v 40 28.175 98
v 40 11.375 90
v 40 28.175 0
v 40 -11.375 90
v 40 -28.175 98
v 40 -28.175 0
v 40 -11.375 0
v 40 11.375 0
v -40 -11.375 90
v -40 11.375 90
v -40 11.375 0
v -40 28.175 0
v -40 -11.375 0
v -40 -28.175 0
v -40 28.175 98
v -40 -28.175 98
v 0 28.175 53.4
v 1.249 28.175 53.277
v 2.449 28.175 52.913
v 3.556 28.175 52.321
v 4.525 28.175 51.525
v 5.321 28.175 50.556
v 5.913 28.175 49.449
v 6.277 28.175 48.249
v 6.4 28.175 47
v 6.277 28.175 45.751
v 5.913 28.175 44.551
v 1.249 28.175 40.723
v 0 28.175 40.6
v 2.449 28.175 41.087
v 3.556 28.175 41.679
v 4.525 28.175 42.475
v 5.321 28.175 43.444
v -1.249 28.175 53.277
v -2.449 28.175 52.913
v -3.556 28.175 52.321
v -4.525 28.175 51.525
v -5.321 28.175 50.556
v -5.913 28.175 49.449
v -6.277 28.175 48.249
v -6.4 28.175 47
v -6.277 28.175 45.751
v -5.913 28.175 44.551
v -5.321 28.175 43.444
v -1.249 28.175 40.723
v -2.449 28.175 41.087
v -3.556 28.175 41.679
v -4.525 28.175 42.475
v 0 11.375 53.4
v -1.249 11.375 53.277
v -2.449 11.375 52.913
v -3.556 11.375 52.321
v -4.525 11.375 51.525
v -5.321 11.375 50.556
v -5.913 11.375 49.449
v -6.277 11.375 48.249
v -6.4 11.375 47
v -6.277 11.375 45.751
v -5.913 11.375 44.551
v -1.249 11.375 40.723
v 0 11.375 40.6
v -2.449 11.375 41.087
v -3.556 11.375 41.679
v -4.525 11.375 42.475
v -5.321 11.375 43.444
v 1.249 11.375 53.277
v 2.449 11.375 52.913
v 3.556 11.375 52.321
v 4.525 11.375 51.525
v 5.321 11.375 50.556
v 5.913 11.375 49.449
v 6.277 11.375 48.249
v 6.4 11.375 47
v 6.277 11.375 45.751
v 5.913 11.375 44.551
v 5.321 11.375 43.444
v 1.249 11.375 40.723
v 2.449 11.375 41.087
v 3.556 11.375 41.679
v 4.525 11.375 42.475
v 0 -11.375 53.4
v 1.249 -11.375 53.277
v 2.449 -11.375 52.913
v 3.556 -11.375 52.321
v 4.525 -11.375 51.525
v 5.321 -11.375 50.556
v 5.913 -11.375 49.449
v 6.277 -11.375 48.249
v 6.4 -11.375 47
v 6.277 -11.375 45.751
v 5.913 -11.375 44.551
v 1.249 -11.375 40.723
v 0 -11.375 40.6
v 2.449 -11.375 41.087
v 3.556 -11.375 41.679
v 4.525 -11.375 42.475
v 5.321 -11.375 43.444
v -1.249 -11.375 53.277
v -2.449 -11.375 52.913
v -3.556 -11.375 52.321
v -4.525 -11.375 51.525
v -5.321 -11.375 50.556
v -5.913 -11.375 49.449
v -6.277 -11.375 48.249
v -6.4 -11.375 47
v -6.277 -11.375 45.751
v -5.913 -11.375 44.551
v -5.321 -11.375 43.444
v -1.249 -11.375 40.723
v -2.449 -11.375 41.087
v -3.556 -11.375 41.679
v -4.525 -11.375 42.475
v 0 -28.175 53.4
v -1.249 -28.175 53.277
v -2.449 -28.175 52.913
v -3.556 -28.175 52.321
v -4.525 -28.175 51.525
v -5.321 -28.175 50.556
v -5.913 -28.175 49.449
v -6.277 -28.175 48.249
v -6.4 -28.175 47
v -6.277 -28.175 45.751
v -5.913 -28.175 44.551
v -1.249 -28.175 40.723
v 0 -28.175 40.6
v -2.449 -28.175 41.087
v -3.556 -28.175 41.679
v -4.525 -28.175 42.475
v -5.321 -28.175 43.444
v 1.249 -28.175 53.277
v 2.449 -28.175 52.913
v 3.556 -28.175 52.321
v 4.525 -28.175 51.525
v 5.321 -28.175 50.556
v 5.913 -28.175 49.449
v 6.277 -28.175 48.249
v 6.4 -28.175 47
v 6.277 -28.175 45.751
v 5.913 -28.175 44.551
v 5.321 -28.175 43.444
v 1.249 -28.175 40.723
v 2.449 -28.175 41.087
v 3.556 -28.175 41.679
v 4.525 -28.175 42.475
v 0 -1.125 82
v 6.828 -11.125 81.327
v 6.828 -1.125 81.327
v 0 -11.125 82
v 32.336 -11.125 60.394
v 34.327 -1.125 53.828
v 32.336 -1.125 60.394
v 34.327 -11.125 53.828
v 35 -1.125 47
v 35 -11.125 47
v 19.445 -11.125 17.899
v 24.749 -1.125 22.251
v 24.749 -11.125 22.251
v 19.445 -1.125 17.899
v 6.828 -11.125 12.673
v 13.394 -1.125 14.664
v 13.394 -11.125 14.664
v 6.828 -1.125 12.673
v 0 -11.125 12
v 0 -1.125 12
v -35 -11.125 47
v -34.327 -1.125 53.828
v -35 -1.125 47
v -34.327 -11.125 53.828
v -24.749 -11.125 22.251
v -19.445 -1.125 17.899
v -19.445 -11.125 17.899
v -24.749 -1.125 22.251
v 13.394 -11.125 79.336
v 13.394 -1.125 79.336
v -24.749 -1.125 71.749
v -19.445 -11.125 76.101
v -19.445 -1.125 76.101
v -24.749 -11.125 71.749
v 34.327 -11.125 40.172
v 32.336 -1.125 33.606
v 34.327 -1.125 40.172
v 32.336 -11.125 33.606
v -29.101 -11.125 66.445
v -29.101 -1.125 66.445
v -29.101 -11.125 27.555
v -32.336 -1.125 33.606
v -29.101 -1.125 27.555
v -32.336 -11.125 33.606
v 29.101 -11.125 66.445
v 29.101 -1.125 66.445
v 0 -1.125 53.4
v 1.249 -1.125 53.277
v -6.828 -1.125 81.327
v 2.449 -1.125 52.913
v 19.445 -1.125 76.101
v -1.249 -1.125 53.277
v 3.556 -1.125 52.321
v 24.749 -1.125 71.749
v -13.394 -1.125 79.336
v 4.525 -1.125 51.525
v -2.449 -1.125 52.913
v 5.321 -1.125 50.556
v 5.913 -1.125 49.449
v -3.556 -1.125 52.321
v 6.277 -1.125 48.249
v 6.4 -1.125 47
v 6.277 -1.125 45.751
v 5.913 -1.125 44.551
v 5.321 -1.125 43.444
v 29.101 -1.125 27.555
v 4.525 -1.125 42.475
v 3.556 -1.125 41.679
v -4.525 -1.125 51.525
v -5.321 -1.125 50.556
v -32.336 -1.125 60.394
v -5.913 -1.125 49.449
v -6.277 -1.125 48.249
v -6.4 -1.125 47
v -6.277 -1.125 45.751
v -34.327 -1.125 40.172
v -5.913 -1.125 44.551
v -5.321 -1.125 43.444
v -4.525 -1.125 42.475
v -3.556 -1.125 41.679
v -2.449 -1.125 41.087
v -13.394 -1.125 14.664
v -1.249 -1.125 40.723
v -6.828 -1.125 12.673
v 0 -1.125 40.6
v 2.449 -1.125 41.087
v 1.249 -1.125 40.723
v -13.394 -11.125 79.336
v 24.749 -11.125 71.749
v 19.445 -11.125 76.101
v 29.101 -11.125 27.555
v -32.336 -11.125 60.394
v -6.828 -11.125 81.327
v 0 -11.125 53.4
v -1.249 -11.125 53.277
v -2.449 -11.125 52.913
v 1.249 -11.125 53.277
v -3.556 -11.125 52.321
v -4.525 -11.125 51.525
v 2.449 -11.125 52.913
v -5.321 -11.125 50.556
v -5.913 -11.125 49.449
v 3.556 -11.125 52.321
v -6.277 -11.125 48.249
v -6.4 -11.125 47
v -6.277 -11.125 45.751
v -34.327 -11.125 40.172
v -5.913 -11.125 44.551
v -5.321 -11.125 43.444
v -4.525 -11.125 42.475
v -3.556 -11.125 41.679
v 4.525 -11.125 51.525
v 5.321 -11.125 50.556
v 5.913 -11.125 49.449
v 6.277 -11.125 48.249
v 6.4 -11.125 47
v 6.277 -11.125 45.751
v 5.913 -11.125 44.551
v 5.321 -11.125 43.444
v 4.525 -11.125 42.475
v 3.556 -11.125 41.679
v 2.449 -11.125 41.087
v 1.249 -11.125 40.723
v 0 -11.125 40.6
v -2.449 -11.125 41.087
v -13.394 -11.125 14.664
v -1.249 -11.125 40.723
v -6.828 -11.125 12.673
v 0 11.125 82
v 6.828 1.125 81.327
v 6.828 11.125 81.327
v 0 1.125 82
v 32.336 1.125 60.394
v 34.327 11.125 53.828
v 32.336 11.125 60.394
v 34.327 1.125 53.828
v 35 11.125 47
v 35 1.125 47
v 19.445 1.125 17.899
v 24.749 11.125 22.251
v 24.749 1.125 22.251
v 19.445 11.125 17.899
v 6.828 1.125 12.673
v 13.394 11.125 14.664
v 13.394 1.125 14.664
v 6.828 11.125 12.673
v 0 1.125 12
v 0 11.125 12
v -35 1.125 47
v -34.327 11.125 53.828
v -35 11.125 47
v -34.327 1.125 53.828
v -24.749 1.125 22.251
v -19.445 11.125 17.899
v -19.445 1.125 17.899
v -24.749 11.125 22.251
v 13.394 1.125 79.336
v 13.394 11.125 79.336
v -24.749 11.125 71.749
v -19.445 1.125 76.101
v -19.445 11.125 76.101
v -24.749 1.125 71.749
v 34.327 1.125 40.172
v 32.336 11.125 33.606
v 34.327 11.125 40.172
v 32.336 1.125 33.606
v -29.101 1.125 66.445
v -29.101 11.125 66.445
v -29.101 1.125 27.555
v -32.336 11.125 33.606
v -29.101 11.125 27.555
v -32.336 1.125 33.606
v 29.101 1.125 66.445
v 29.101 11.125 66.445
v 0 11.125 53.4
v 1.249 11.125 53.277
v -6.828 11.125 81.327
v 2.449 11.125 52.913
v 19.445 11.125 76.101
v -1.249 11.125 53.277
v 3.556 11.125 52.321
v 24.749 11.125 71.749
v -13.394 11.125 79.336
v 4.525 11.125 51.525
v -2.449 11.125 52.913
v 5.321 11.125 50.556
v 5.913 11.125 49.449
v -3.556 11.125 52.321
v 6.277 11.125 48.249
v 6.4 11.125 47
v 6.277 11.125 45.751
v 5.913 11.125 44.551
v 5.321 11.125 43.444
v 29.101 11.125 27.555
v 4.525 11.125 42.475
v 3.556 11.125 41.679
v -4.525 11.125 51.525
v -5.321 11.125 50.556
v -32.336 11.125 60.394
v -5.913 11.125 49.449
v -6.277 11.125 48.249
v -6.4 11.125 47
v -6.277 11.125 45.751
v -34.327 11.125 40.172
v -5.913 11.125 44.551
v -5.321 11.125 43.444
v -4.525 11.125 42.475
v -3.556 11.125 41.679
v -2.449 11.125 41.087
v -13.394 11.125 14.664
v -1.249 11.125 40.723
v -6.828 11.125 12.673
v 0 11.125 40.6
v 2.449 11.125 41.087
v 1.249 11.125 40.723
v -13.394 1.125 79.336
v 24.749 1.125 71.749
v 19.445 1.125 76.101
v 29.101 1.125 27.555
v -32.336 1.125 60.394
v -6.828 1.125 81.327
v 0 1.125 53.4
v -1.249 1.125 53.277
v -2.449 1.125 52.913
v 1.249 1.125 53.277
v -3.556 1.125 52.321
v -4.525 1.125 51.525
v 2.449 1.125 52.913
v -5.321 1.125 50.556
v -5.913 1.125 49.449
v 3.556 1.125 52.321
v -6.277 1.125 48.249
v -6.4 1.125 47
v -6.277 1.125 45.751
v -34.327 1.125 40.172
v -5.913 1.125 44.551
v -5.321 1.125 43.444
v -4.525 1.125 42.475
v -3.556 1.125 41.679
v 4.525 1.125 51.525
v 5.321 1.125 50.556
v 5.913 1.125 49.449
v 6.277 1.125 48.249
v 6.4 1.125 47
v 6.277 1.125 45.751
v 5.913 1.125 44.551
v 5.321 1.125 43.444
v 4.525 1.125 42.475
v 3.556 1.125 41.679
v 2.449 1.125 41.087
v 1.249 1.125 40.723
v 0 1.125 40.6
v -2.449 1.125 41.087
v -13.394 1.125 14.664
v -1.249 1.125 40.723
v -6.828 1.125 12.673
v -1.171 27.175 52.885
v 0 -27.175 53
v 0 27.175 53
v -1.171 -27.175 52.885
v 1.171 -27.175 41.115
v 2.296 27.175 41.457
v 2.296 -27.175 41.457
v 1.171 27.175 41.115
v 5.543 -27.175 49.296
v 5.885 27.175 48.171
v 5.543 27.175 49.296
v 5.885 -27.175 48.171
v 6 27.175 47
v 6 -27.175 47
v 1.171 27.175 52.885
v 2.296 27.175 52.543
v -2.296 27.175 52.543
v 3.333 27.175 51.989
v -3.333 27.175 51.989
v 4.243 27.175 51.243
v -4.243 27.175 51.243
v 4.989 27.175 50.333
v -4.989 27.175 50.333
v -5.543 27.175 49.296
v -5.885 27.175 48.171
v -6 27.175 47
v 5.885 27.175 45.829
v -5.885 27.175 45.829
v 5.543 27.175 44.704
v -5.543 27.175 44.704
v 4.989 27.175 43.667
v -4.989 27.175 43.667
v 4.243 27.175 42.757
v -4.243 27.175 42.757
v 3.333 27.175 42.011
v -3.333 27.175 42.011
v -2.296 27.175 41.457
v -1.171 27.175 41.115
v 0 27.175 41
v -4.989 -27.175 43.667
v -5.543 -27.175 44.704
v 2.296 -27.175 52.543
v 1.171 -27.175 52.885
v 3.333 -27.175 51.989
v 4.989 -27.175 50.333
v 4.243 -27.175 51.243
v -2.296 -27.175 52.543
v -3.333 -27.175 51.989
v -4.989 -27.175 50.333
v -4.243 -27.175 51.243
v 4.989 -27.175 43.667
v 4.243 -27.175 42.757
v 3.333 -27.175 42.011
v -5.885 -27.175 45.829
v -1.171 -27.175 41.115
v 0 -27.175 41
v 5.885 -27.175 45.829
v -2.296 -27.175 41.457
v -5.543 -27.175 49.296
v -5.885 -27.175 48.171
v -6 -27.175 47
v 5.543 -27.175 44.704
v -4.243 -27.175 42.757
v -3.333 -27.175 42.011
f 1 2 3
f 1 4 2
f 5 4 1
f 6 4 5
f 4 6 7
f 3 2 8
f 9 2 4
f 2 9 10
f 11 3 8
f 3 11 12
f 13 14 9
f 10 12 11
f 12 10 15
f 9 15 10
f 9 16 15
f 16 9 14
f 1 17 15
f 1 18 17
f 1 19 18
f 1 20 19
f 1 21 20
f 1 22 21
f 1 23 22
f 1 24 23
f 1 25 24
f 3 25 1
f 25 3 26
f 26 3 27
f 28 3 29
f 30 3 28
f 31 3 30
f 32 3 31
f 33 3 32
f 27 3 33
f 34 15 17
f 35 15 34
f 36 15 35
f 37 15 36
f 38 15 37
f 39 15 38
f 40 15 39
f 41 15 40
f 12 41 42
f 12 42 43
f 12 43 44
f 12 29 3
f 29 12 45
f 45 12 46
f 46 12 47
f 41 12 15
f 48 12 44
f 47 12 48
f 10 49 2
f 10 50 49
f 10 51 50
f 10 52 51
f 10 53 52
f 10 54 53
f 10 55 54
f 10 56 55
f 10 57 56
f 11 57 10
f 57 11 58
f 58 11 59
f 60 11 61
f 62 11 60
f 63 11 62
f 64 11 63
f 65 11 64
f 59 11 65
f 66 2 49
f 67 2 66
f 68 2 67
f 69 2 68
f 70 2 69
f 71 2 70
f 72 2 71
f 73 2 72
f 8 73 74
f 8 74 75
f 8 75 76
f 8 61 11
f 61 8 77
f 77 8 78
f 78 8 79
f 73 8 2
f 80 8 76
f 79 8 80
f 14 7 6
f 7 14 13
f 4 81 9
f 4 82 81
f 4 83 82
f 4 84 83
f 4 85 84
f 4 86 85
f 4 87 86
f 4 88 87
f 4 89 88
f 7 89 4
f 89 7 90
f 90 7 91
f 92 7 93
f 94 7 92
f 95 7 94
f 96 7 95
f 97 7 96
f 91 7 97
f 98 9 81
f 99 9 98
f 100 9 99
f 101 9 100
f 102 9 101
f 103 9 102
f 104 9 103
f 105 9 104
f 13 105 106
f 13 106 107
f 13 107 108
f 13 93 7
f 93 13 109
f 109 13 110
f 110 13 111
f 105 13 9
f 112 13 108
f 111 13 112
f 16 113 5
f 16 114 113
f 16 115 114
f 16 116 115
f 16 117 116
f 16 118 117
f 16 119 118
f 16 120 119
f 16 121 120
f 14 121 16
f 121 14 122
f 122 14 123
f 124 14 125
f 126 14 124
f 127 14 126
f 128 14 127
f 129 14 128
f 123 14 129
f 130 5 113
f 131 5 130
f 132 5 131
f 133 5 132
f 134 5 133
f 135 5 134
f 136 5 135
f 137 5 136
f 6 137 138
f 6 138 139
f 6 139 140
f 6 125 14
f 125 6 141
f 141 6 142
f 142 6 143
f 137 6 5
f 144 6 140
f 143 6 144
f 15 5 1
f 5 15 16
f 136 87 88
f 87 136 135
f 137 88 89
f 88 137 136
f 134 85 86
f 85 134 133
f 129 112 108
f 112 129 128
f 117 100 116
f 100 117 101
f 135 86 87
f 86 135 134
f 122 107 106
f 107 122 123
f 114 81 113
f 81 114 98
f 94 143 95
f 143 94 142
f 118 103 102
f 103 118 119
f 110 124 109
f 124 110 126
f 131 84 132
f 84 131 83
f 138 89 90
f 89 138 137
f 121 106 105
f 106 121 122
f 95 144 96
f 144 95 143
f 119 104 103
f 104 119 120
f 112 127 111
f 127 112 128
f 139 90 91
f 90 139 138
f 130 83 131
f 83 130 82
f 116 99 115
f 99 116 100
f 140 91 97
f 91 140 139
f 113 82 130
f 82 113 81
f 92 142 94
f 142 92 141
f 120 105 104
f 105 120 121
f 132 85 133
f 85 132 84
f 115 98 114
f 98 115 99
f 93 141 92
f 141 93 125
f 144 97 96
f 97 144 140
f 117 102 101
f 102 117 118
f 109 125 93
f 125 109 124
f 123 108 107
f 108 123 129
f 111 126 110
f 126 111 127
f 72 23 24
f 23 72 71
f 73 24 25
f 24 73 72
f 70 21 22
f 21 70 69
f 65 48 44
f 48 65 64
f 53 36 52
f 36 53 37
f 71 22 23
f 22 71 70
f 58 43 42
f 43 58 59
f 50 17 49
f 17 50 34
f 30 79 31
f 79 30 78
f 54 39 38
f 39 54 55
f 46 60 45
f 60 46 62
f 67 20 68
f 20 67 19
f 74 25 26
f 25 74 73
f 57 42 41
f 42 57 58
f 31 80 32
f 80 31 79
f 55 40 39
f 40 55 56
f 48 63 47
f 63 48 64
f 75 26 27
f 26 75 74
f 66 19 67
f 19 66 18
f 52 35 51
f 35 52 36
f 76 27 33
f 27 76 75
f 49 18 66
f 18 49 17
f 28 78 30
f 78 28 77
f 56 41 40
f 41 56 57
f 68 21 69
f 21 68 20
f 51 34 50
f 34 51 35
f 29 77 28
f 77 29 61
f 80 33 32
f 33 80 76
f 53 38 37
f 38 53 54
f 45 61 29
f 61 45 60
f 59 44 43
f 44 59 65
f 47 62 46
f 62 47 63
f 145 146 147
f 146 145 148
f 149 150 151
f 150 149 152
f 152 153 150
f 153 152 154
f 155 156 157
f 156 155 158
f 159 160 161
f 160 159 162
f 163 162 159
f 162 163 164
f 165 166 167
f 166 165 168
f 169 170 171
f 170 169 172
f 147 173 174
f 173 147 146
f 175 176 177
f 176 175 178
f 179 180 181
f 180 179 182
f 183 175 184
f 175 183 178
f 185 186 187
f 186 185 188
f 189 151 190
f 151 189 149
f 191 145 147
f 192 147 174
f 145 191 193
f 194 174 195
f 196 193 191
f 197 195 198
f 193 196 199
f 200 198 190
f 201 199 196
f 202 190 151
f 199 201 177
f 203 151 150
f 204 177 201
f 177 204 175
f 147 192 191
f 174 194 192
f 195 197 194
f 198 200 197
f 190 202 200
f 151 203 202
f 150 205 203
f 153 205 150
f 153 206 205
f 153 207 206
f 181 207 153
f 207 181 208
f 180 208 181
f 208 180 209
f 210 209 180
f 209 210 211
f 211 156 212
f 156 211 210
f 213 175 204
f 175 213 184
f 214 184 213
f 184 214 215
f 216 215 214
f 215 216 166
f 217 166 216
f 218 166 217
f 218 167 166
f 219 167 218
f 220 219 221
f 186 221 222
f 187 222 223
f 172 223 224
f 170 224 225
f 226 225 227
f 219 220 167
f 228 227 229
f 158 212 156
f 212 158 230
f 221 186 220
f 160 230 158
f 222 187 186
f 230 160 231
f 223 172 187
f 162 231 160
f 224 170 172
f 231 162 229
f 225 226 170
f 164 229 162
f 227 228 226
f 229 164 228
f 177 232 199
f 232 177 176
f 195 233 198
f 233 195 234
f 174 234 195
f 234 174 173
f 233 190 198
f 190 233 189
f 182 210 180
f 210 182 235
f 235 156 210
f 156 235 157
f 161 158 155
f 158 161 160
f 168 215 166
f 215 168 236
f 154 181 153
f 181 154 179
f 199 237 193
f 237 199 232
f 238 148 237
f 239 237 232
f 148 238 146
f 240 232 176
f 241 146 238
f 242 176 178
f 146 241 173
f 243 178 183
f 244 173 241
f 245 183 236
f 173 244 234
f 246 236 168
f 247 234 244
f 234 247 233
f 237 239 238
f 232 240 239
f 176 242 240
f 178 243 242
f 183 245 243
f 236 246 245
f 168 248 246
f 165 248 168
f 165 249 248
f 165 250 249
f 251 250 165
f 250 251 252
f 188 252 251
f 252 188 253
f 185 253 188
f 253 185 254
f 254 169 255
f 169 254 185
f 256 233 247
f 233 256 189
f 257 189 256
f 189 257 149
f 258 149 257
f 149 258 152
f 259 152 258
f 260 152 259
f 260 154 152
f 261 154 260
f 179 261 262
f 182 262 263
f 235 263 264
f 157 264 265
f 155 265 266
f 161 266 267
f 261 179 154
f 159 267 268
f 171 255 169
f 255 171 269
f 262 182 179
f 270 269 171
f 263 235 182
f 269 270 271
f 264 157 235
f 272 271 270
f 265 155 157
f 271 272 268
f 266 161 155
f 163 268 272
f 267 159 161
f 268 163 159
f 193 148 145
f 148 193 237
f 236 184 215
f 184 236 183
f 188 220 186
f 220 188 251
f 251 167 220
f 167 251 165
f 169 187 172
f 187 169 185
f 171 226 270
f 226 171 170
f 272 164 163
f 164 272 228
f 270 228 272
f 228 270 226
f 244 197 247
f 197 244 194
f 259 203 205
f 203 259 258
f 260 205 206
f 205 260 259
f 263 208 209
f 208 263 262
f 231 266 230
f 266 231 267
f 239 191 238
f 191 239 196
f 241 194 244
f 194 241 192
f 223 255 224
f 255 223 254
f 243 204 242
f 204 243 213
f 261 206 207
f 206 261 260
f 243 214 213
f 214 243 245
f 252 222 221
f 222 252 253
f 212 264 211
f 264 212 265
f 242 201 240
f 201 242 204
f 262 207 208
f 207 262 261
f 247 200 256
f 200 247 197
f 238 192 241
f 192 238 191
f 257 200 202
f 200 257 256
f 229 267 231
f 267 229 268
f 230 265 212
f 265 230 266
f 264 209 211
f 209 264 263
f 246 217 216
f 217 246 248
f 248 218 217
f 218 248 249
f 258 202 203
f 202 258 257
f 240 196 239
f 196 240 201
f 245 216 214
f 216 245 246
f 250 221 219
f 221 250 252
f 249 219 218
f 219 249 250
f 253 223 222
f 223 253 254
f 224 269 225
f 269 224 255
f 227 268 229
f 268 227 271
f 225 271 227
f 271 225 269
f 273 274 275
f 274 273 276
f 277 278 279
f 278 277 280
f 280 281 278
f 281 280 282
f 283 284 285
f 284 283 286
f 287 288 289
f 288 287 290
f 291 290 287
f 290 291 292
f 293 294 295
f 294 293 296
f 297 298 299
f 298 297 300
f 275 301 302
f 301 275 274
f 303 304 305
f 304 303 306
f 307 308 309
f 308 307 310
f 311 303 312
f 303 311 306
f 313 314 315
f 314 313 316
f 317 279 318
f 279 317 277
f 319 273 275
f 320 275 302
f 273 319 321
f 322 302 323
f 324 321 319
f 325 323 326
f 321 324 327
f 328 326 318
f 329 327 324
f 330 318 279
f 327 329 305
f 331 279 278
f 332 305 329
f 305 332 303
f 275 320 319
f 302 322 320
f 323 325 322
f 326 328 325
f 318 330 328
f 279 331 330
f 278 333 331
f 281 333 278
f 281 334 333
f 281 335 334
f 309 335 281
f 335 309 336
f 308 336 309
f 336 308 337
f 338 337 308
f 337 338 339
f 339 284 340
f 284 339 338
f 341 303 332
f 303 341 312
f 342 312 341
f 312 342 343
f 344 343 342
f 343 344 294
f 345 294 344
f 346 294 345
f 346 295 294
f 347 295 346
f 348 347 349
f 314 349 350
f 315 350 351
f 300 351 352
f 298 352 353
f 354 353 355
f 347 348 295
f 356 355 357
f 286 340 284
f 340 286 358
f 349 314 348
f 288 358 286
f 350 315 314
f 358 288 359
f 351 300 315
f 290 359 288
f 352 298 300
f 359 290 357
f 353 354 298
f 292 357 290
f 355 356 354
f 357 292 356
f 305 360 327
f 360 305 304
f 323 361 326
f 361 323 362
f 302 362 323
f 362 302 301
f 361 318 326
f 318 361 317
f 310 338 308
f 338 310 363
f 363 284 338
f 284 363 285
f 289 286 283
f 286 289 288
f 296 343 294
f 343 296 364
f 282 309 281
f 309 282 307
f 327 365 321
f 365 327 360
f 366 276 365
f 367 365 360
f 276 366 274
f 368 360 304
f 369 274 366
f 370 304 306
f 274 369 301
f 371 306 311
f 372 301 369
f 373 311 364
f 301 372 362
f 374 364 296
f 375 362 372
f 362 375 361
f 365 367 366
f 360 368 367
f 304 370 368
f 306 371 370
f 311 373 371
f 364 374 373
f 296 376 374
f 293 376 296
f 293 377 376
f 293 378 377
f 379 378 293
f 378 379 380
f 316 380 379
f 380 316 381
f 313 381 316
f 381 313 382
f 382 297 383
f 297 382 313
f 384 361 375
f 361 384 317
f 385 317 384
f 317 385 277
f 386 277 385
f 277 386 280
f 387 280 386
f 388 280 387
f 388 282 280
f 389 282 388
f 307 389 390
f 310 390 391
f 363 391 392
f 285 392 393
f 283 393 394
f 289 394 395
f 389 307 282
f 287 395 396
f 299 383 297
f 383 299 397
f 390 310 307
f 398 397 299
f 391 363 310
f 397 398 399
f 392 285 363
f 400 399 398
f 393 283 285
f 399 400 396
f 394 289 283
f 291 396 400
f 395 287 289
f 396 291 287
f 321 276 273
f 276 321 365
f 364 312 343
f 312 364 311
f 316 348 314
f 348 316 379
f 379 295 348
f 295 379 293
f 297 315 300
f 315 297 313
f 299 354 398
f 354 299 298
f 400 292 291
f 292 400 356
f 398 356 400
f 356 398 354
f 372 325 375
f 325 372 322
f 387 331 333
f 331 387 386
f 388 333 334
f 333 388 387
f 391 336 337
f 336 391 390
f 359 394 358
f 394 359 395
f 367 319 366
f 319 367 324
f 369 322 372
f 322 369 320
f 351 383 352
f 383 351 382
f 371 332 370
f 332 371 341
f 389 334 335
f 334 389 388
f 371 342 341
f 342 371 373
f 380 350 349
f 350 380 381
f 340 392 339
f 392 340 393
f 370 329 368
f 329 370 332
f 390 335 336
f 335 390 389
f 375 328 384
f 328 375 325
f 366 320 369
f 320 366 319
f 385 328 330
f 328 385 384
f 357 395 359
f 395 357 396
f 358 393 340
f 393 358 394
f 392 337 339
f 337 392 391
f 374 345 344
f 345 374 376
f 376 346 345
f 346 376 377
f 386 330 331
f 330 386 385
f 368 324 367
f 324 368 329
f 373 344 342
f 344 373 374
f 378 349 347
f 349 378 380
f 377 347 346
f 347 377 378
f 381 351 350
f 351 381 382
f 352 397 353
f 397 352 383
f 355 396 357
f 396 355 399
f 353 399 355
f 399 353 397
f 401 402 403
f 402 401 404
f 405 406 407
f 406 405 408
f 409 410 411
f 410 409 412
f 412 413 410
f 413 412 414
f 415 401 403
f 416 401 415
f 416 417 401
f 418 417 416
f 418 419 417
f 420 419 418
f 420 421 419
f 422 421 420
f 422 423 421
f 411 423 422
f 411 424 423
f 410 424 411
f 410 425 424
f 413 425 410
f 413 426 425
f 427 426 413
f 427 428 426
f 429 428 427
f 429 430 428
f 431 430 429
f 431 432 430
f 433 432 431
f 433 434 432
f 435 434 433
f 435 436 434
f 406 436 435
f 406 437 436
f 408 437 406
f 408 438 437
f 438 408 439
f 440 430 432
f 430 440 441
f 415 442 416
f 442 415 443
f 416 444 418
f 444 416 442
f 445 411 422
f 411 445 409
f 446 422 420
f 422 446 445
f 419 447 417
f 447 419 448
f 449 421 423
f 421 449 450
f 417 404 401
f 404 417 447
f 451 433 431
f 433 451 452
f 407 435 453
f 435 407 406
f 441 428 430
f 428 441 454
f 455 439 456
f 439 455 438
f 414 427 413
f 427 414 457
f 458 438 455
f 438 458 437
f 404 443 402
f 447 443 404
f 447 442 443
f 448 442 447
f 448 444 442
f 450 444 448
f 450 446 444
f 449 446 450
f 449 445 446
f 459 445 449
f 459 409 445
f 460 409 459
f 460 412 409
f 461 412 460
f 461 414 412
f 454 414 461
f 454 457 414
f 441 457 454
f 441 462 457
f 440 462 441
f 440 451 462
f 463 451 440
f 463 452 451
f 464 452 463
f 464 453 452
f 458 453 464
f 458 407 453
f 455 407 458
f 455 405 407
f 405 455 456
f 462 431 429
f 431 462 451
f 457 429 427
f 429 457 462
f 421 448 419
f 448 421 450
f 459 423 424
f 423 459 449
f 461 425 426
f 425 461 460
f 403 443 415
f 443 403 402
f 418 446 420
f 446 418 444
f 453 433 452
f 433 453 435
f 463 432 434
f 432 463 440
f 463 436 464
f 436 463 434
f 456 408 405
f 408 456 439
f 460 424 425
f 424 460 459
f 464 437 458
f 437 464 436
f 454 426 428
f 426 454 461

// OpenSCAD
$fn = 32;

// ------------------------------------------------------------------------
// Trolley wheel set: wheels d70, fork 90 mm tall
// Every part is its own module, assembly() places every instance.
// ------------------------------------------------------------------------

// --- part 1 ---
module trolley_fork() {
  difference() {
    union() {
      translate([-40, 11.375, 0]) cube([80, 16.8, 90]);
      translate([-40, -28.175, 0]) cube([80, 16.8, 90]);
      translate([-40, -28.175, 90]) cube([80, 56.35, 8]);
    }
    translate([0, -19.775, 47]) rotate([90, 0, 0]) cylinder(h = 18.8, d = 12.8, center = true);
    translate([0, 19.775, 47]) rotate([90, 0, 0]) cylinder(h = 18.8, d = 12.8, center = true);
  }
}

// --- part 2 ---
module trolley_wheel() {
  difference() {
      translate([0, 0, 0]) cylinder(h = 10, d = 70);
      translate([0, 0, -1]) cylinder(h = 12, d = 12.8);
    }
}

// --- part 3 ---
module trolley_axle() {
  translate([0, 0, -27.175]) cylinder(h = 54.35, d = 12);
}

// --- assembly ---
module assembly() {
  color([0.80, 0.24, 0.20]) translate([0, 0, 0]) rotate([0, 0, 0]) trolley_fork();
  color([0.20, 0.45, 0.75]) translate([0, -1.125, 47]) rotate([90, 0, 0]) trolley_wheel();
  color([0.25, 0.62, 0.32]) translate([0, 11.125, 47]) rotate([90, 0, 0]) trolley_wheel();
  color([0.92, 0.70, 0.18]) translate([0, 0, 47]) rotate([90, 0, 0]) trolley_axle();
}

assembly();
